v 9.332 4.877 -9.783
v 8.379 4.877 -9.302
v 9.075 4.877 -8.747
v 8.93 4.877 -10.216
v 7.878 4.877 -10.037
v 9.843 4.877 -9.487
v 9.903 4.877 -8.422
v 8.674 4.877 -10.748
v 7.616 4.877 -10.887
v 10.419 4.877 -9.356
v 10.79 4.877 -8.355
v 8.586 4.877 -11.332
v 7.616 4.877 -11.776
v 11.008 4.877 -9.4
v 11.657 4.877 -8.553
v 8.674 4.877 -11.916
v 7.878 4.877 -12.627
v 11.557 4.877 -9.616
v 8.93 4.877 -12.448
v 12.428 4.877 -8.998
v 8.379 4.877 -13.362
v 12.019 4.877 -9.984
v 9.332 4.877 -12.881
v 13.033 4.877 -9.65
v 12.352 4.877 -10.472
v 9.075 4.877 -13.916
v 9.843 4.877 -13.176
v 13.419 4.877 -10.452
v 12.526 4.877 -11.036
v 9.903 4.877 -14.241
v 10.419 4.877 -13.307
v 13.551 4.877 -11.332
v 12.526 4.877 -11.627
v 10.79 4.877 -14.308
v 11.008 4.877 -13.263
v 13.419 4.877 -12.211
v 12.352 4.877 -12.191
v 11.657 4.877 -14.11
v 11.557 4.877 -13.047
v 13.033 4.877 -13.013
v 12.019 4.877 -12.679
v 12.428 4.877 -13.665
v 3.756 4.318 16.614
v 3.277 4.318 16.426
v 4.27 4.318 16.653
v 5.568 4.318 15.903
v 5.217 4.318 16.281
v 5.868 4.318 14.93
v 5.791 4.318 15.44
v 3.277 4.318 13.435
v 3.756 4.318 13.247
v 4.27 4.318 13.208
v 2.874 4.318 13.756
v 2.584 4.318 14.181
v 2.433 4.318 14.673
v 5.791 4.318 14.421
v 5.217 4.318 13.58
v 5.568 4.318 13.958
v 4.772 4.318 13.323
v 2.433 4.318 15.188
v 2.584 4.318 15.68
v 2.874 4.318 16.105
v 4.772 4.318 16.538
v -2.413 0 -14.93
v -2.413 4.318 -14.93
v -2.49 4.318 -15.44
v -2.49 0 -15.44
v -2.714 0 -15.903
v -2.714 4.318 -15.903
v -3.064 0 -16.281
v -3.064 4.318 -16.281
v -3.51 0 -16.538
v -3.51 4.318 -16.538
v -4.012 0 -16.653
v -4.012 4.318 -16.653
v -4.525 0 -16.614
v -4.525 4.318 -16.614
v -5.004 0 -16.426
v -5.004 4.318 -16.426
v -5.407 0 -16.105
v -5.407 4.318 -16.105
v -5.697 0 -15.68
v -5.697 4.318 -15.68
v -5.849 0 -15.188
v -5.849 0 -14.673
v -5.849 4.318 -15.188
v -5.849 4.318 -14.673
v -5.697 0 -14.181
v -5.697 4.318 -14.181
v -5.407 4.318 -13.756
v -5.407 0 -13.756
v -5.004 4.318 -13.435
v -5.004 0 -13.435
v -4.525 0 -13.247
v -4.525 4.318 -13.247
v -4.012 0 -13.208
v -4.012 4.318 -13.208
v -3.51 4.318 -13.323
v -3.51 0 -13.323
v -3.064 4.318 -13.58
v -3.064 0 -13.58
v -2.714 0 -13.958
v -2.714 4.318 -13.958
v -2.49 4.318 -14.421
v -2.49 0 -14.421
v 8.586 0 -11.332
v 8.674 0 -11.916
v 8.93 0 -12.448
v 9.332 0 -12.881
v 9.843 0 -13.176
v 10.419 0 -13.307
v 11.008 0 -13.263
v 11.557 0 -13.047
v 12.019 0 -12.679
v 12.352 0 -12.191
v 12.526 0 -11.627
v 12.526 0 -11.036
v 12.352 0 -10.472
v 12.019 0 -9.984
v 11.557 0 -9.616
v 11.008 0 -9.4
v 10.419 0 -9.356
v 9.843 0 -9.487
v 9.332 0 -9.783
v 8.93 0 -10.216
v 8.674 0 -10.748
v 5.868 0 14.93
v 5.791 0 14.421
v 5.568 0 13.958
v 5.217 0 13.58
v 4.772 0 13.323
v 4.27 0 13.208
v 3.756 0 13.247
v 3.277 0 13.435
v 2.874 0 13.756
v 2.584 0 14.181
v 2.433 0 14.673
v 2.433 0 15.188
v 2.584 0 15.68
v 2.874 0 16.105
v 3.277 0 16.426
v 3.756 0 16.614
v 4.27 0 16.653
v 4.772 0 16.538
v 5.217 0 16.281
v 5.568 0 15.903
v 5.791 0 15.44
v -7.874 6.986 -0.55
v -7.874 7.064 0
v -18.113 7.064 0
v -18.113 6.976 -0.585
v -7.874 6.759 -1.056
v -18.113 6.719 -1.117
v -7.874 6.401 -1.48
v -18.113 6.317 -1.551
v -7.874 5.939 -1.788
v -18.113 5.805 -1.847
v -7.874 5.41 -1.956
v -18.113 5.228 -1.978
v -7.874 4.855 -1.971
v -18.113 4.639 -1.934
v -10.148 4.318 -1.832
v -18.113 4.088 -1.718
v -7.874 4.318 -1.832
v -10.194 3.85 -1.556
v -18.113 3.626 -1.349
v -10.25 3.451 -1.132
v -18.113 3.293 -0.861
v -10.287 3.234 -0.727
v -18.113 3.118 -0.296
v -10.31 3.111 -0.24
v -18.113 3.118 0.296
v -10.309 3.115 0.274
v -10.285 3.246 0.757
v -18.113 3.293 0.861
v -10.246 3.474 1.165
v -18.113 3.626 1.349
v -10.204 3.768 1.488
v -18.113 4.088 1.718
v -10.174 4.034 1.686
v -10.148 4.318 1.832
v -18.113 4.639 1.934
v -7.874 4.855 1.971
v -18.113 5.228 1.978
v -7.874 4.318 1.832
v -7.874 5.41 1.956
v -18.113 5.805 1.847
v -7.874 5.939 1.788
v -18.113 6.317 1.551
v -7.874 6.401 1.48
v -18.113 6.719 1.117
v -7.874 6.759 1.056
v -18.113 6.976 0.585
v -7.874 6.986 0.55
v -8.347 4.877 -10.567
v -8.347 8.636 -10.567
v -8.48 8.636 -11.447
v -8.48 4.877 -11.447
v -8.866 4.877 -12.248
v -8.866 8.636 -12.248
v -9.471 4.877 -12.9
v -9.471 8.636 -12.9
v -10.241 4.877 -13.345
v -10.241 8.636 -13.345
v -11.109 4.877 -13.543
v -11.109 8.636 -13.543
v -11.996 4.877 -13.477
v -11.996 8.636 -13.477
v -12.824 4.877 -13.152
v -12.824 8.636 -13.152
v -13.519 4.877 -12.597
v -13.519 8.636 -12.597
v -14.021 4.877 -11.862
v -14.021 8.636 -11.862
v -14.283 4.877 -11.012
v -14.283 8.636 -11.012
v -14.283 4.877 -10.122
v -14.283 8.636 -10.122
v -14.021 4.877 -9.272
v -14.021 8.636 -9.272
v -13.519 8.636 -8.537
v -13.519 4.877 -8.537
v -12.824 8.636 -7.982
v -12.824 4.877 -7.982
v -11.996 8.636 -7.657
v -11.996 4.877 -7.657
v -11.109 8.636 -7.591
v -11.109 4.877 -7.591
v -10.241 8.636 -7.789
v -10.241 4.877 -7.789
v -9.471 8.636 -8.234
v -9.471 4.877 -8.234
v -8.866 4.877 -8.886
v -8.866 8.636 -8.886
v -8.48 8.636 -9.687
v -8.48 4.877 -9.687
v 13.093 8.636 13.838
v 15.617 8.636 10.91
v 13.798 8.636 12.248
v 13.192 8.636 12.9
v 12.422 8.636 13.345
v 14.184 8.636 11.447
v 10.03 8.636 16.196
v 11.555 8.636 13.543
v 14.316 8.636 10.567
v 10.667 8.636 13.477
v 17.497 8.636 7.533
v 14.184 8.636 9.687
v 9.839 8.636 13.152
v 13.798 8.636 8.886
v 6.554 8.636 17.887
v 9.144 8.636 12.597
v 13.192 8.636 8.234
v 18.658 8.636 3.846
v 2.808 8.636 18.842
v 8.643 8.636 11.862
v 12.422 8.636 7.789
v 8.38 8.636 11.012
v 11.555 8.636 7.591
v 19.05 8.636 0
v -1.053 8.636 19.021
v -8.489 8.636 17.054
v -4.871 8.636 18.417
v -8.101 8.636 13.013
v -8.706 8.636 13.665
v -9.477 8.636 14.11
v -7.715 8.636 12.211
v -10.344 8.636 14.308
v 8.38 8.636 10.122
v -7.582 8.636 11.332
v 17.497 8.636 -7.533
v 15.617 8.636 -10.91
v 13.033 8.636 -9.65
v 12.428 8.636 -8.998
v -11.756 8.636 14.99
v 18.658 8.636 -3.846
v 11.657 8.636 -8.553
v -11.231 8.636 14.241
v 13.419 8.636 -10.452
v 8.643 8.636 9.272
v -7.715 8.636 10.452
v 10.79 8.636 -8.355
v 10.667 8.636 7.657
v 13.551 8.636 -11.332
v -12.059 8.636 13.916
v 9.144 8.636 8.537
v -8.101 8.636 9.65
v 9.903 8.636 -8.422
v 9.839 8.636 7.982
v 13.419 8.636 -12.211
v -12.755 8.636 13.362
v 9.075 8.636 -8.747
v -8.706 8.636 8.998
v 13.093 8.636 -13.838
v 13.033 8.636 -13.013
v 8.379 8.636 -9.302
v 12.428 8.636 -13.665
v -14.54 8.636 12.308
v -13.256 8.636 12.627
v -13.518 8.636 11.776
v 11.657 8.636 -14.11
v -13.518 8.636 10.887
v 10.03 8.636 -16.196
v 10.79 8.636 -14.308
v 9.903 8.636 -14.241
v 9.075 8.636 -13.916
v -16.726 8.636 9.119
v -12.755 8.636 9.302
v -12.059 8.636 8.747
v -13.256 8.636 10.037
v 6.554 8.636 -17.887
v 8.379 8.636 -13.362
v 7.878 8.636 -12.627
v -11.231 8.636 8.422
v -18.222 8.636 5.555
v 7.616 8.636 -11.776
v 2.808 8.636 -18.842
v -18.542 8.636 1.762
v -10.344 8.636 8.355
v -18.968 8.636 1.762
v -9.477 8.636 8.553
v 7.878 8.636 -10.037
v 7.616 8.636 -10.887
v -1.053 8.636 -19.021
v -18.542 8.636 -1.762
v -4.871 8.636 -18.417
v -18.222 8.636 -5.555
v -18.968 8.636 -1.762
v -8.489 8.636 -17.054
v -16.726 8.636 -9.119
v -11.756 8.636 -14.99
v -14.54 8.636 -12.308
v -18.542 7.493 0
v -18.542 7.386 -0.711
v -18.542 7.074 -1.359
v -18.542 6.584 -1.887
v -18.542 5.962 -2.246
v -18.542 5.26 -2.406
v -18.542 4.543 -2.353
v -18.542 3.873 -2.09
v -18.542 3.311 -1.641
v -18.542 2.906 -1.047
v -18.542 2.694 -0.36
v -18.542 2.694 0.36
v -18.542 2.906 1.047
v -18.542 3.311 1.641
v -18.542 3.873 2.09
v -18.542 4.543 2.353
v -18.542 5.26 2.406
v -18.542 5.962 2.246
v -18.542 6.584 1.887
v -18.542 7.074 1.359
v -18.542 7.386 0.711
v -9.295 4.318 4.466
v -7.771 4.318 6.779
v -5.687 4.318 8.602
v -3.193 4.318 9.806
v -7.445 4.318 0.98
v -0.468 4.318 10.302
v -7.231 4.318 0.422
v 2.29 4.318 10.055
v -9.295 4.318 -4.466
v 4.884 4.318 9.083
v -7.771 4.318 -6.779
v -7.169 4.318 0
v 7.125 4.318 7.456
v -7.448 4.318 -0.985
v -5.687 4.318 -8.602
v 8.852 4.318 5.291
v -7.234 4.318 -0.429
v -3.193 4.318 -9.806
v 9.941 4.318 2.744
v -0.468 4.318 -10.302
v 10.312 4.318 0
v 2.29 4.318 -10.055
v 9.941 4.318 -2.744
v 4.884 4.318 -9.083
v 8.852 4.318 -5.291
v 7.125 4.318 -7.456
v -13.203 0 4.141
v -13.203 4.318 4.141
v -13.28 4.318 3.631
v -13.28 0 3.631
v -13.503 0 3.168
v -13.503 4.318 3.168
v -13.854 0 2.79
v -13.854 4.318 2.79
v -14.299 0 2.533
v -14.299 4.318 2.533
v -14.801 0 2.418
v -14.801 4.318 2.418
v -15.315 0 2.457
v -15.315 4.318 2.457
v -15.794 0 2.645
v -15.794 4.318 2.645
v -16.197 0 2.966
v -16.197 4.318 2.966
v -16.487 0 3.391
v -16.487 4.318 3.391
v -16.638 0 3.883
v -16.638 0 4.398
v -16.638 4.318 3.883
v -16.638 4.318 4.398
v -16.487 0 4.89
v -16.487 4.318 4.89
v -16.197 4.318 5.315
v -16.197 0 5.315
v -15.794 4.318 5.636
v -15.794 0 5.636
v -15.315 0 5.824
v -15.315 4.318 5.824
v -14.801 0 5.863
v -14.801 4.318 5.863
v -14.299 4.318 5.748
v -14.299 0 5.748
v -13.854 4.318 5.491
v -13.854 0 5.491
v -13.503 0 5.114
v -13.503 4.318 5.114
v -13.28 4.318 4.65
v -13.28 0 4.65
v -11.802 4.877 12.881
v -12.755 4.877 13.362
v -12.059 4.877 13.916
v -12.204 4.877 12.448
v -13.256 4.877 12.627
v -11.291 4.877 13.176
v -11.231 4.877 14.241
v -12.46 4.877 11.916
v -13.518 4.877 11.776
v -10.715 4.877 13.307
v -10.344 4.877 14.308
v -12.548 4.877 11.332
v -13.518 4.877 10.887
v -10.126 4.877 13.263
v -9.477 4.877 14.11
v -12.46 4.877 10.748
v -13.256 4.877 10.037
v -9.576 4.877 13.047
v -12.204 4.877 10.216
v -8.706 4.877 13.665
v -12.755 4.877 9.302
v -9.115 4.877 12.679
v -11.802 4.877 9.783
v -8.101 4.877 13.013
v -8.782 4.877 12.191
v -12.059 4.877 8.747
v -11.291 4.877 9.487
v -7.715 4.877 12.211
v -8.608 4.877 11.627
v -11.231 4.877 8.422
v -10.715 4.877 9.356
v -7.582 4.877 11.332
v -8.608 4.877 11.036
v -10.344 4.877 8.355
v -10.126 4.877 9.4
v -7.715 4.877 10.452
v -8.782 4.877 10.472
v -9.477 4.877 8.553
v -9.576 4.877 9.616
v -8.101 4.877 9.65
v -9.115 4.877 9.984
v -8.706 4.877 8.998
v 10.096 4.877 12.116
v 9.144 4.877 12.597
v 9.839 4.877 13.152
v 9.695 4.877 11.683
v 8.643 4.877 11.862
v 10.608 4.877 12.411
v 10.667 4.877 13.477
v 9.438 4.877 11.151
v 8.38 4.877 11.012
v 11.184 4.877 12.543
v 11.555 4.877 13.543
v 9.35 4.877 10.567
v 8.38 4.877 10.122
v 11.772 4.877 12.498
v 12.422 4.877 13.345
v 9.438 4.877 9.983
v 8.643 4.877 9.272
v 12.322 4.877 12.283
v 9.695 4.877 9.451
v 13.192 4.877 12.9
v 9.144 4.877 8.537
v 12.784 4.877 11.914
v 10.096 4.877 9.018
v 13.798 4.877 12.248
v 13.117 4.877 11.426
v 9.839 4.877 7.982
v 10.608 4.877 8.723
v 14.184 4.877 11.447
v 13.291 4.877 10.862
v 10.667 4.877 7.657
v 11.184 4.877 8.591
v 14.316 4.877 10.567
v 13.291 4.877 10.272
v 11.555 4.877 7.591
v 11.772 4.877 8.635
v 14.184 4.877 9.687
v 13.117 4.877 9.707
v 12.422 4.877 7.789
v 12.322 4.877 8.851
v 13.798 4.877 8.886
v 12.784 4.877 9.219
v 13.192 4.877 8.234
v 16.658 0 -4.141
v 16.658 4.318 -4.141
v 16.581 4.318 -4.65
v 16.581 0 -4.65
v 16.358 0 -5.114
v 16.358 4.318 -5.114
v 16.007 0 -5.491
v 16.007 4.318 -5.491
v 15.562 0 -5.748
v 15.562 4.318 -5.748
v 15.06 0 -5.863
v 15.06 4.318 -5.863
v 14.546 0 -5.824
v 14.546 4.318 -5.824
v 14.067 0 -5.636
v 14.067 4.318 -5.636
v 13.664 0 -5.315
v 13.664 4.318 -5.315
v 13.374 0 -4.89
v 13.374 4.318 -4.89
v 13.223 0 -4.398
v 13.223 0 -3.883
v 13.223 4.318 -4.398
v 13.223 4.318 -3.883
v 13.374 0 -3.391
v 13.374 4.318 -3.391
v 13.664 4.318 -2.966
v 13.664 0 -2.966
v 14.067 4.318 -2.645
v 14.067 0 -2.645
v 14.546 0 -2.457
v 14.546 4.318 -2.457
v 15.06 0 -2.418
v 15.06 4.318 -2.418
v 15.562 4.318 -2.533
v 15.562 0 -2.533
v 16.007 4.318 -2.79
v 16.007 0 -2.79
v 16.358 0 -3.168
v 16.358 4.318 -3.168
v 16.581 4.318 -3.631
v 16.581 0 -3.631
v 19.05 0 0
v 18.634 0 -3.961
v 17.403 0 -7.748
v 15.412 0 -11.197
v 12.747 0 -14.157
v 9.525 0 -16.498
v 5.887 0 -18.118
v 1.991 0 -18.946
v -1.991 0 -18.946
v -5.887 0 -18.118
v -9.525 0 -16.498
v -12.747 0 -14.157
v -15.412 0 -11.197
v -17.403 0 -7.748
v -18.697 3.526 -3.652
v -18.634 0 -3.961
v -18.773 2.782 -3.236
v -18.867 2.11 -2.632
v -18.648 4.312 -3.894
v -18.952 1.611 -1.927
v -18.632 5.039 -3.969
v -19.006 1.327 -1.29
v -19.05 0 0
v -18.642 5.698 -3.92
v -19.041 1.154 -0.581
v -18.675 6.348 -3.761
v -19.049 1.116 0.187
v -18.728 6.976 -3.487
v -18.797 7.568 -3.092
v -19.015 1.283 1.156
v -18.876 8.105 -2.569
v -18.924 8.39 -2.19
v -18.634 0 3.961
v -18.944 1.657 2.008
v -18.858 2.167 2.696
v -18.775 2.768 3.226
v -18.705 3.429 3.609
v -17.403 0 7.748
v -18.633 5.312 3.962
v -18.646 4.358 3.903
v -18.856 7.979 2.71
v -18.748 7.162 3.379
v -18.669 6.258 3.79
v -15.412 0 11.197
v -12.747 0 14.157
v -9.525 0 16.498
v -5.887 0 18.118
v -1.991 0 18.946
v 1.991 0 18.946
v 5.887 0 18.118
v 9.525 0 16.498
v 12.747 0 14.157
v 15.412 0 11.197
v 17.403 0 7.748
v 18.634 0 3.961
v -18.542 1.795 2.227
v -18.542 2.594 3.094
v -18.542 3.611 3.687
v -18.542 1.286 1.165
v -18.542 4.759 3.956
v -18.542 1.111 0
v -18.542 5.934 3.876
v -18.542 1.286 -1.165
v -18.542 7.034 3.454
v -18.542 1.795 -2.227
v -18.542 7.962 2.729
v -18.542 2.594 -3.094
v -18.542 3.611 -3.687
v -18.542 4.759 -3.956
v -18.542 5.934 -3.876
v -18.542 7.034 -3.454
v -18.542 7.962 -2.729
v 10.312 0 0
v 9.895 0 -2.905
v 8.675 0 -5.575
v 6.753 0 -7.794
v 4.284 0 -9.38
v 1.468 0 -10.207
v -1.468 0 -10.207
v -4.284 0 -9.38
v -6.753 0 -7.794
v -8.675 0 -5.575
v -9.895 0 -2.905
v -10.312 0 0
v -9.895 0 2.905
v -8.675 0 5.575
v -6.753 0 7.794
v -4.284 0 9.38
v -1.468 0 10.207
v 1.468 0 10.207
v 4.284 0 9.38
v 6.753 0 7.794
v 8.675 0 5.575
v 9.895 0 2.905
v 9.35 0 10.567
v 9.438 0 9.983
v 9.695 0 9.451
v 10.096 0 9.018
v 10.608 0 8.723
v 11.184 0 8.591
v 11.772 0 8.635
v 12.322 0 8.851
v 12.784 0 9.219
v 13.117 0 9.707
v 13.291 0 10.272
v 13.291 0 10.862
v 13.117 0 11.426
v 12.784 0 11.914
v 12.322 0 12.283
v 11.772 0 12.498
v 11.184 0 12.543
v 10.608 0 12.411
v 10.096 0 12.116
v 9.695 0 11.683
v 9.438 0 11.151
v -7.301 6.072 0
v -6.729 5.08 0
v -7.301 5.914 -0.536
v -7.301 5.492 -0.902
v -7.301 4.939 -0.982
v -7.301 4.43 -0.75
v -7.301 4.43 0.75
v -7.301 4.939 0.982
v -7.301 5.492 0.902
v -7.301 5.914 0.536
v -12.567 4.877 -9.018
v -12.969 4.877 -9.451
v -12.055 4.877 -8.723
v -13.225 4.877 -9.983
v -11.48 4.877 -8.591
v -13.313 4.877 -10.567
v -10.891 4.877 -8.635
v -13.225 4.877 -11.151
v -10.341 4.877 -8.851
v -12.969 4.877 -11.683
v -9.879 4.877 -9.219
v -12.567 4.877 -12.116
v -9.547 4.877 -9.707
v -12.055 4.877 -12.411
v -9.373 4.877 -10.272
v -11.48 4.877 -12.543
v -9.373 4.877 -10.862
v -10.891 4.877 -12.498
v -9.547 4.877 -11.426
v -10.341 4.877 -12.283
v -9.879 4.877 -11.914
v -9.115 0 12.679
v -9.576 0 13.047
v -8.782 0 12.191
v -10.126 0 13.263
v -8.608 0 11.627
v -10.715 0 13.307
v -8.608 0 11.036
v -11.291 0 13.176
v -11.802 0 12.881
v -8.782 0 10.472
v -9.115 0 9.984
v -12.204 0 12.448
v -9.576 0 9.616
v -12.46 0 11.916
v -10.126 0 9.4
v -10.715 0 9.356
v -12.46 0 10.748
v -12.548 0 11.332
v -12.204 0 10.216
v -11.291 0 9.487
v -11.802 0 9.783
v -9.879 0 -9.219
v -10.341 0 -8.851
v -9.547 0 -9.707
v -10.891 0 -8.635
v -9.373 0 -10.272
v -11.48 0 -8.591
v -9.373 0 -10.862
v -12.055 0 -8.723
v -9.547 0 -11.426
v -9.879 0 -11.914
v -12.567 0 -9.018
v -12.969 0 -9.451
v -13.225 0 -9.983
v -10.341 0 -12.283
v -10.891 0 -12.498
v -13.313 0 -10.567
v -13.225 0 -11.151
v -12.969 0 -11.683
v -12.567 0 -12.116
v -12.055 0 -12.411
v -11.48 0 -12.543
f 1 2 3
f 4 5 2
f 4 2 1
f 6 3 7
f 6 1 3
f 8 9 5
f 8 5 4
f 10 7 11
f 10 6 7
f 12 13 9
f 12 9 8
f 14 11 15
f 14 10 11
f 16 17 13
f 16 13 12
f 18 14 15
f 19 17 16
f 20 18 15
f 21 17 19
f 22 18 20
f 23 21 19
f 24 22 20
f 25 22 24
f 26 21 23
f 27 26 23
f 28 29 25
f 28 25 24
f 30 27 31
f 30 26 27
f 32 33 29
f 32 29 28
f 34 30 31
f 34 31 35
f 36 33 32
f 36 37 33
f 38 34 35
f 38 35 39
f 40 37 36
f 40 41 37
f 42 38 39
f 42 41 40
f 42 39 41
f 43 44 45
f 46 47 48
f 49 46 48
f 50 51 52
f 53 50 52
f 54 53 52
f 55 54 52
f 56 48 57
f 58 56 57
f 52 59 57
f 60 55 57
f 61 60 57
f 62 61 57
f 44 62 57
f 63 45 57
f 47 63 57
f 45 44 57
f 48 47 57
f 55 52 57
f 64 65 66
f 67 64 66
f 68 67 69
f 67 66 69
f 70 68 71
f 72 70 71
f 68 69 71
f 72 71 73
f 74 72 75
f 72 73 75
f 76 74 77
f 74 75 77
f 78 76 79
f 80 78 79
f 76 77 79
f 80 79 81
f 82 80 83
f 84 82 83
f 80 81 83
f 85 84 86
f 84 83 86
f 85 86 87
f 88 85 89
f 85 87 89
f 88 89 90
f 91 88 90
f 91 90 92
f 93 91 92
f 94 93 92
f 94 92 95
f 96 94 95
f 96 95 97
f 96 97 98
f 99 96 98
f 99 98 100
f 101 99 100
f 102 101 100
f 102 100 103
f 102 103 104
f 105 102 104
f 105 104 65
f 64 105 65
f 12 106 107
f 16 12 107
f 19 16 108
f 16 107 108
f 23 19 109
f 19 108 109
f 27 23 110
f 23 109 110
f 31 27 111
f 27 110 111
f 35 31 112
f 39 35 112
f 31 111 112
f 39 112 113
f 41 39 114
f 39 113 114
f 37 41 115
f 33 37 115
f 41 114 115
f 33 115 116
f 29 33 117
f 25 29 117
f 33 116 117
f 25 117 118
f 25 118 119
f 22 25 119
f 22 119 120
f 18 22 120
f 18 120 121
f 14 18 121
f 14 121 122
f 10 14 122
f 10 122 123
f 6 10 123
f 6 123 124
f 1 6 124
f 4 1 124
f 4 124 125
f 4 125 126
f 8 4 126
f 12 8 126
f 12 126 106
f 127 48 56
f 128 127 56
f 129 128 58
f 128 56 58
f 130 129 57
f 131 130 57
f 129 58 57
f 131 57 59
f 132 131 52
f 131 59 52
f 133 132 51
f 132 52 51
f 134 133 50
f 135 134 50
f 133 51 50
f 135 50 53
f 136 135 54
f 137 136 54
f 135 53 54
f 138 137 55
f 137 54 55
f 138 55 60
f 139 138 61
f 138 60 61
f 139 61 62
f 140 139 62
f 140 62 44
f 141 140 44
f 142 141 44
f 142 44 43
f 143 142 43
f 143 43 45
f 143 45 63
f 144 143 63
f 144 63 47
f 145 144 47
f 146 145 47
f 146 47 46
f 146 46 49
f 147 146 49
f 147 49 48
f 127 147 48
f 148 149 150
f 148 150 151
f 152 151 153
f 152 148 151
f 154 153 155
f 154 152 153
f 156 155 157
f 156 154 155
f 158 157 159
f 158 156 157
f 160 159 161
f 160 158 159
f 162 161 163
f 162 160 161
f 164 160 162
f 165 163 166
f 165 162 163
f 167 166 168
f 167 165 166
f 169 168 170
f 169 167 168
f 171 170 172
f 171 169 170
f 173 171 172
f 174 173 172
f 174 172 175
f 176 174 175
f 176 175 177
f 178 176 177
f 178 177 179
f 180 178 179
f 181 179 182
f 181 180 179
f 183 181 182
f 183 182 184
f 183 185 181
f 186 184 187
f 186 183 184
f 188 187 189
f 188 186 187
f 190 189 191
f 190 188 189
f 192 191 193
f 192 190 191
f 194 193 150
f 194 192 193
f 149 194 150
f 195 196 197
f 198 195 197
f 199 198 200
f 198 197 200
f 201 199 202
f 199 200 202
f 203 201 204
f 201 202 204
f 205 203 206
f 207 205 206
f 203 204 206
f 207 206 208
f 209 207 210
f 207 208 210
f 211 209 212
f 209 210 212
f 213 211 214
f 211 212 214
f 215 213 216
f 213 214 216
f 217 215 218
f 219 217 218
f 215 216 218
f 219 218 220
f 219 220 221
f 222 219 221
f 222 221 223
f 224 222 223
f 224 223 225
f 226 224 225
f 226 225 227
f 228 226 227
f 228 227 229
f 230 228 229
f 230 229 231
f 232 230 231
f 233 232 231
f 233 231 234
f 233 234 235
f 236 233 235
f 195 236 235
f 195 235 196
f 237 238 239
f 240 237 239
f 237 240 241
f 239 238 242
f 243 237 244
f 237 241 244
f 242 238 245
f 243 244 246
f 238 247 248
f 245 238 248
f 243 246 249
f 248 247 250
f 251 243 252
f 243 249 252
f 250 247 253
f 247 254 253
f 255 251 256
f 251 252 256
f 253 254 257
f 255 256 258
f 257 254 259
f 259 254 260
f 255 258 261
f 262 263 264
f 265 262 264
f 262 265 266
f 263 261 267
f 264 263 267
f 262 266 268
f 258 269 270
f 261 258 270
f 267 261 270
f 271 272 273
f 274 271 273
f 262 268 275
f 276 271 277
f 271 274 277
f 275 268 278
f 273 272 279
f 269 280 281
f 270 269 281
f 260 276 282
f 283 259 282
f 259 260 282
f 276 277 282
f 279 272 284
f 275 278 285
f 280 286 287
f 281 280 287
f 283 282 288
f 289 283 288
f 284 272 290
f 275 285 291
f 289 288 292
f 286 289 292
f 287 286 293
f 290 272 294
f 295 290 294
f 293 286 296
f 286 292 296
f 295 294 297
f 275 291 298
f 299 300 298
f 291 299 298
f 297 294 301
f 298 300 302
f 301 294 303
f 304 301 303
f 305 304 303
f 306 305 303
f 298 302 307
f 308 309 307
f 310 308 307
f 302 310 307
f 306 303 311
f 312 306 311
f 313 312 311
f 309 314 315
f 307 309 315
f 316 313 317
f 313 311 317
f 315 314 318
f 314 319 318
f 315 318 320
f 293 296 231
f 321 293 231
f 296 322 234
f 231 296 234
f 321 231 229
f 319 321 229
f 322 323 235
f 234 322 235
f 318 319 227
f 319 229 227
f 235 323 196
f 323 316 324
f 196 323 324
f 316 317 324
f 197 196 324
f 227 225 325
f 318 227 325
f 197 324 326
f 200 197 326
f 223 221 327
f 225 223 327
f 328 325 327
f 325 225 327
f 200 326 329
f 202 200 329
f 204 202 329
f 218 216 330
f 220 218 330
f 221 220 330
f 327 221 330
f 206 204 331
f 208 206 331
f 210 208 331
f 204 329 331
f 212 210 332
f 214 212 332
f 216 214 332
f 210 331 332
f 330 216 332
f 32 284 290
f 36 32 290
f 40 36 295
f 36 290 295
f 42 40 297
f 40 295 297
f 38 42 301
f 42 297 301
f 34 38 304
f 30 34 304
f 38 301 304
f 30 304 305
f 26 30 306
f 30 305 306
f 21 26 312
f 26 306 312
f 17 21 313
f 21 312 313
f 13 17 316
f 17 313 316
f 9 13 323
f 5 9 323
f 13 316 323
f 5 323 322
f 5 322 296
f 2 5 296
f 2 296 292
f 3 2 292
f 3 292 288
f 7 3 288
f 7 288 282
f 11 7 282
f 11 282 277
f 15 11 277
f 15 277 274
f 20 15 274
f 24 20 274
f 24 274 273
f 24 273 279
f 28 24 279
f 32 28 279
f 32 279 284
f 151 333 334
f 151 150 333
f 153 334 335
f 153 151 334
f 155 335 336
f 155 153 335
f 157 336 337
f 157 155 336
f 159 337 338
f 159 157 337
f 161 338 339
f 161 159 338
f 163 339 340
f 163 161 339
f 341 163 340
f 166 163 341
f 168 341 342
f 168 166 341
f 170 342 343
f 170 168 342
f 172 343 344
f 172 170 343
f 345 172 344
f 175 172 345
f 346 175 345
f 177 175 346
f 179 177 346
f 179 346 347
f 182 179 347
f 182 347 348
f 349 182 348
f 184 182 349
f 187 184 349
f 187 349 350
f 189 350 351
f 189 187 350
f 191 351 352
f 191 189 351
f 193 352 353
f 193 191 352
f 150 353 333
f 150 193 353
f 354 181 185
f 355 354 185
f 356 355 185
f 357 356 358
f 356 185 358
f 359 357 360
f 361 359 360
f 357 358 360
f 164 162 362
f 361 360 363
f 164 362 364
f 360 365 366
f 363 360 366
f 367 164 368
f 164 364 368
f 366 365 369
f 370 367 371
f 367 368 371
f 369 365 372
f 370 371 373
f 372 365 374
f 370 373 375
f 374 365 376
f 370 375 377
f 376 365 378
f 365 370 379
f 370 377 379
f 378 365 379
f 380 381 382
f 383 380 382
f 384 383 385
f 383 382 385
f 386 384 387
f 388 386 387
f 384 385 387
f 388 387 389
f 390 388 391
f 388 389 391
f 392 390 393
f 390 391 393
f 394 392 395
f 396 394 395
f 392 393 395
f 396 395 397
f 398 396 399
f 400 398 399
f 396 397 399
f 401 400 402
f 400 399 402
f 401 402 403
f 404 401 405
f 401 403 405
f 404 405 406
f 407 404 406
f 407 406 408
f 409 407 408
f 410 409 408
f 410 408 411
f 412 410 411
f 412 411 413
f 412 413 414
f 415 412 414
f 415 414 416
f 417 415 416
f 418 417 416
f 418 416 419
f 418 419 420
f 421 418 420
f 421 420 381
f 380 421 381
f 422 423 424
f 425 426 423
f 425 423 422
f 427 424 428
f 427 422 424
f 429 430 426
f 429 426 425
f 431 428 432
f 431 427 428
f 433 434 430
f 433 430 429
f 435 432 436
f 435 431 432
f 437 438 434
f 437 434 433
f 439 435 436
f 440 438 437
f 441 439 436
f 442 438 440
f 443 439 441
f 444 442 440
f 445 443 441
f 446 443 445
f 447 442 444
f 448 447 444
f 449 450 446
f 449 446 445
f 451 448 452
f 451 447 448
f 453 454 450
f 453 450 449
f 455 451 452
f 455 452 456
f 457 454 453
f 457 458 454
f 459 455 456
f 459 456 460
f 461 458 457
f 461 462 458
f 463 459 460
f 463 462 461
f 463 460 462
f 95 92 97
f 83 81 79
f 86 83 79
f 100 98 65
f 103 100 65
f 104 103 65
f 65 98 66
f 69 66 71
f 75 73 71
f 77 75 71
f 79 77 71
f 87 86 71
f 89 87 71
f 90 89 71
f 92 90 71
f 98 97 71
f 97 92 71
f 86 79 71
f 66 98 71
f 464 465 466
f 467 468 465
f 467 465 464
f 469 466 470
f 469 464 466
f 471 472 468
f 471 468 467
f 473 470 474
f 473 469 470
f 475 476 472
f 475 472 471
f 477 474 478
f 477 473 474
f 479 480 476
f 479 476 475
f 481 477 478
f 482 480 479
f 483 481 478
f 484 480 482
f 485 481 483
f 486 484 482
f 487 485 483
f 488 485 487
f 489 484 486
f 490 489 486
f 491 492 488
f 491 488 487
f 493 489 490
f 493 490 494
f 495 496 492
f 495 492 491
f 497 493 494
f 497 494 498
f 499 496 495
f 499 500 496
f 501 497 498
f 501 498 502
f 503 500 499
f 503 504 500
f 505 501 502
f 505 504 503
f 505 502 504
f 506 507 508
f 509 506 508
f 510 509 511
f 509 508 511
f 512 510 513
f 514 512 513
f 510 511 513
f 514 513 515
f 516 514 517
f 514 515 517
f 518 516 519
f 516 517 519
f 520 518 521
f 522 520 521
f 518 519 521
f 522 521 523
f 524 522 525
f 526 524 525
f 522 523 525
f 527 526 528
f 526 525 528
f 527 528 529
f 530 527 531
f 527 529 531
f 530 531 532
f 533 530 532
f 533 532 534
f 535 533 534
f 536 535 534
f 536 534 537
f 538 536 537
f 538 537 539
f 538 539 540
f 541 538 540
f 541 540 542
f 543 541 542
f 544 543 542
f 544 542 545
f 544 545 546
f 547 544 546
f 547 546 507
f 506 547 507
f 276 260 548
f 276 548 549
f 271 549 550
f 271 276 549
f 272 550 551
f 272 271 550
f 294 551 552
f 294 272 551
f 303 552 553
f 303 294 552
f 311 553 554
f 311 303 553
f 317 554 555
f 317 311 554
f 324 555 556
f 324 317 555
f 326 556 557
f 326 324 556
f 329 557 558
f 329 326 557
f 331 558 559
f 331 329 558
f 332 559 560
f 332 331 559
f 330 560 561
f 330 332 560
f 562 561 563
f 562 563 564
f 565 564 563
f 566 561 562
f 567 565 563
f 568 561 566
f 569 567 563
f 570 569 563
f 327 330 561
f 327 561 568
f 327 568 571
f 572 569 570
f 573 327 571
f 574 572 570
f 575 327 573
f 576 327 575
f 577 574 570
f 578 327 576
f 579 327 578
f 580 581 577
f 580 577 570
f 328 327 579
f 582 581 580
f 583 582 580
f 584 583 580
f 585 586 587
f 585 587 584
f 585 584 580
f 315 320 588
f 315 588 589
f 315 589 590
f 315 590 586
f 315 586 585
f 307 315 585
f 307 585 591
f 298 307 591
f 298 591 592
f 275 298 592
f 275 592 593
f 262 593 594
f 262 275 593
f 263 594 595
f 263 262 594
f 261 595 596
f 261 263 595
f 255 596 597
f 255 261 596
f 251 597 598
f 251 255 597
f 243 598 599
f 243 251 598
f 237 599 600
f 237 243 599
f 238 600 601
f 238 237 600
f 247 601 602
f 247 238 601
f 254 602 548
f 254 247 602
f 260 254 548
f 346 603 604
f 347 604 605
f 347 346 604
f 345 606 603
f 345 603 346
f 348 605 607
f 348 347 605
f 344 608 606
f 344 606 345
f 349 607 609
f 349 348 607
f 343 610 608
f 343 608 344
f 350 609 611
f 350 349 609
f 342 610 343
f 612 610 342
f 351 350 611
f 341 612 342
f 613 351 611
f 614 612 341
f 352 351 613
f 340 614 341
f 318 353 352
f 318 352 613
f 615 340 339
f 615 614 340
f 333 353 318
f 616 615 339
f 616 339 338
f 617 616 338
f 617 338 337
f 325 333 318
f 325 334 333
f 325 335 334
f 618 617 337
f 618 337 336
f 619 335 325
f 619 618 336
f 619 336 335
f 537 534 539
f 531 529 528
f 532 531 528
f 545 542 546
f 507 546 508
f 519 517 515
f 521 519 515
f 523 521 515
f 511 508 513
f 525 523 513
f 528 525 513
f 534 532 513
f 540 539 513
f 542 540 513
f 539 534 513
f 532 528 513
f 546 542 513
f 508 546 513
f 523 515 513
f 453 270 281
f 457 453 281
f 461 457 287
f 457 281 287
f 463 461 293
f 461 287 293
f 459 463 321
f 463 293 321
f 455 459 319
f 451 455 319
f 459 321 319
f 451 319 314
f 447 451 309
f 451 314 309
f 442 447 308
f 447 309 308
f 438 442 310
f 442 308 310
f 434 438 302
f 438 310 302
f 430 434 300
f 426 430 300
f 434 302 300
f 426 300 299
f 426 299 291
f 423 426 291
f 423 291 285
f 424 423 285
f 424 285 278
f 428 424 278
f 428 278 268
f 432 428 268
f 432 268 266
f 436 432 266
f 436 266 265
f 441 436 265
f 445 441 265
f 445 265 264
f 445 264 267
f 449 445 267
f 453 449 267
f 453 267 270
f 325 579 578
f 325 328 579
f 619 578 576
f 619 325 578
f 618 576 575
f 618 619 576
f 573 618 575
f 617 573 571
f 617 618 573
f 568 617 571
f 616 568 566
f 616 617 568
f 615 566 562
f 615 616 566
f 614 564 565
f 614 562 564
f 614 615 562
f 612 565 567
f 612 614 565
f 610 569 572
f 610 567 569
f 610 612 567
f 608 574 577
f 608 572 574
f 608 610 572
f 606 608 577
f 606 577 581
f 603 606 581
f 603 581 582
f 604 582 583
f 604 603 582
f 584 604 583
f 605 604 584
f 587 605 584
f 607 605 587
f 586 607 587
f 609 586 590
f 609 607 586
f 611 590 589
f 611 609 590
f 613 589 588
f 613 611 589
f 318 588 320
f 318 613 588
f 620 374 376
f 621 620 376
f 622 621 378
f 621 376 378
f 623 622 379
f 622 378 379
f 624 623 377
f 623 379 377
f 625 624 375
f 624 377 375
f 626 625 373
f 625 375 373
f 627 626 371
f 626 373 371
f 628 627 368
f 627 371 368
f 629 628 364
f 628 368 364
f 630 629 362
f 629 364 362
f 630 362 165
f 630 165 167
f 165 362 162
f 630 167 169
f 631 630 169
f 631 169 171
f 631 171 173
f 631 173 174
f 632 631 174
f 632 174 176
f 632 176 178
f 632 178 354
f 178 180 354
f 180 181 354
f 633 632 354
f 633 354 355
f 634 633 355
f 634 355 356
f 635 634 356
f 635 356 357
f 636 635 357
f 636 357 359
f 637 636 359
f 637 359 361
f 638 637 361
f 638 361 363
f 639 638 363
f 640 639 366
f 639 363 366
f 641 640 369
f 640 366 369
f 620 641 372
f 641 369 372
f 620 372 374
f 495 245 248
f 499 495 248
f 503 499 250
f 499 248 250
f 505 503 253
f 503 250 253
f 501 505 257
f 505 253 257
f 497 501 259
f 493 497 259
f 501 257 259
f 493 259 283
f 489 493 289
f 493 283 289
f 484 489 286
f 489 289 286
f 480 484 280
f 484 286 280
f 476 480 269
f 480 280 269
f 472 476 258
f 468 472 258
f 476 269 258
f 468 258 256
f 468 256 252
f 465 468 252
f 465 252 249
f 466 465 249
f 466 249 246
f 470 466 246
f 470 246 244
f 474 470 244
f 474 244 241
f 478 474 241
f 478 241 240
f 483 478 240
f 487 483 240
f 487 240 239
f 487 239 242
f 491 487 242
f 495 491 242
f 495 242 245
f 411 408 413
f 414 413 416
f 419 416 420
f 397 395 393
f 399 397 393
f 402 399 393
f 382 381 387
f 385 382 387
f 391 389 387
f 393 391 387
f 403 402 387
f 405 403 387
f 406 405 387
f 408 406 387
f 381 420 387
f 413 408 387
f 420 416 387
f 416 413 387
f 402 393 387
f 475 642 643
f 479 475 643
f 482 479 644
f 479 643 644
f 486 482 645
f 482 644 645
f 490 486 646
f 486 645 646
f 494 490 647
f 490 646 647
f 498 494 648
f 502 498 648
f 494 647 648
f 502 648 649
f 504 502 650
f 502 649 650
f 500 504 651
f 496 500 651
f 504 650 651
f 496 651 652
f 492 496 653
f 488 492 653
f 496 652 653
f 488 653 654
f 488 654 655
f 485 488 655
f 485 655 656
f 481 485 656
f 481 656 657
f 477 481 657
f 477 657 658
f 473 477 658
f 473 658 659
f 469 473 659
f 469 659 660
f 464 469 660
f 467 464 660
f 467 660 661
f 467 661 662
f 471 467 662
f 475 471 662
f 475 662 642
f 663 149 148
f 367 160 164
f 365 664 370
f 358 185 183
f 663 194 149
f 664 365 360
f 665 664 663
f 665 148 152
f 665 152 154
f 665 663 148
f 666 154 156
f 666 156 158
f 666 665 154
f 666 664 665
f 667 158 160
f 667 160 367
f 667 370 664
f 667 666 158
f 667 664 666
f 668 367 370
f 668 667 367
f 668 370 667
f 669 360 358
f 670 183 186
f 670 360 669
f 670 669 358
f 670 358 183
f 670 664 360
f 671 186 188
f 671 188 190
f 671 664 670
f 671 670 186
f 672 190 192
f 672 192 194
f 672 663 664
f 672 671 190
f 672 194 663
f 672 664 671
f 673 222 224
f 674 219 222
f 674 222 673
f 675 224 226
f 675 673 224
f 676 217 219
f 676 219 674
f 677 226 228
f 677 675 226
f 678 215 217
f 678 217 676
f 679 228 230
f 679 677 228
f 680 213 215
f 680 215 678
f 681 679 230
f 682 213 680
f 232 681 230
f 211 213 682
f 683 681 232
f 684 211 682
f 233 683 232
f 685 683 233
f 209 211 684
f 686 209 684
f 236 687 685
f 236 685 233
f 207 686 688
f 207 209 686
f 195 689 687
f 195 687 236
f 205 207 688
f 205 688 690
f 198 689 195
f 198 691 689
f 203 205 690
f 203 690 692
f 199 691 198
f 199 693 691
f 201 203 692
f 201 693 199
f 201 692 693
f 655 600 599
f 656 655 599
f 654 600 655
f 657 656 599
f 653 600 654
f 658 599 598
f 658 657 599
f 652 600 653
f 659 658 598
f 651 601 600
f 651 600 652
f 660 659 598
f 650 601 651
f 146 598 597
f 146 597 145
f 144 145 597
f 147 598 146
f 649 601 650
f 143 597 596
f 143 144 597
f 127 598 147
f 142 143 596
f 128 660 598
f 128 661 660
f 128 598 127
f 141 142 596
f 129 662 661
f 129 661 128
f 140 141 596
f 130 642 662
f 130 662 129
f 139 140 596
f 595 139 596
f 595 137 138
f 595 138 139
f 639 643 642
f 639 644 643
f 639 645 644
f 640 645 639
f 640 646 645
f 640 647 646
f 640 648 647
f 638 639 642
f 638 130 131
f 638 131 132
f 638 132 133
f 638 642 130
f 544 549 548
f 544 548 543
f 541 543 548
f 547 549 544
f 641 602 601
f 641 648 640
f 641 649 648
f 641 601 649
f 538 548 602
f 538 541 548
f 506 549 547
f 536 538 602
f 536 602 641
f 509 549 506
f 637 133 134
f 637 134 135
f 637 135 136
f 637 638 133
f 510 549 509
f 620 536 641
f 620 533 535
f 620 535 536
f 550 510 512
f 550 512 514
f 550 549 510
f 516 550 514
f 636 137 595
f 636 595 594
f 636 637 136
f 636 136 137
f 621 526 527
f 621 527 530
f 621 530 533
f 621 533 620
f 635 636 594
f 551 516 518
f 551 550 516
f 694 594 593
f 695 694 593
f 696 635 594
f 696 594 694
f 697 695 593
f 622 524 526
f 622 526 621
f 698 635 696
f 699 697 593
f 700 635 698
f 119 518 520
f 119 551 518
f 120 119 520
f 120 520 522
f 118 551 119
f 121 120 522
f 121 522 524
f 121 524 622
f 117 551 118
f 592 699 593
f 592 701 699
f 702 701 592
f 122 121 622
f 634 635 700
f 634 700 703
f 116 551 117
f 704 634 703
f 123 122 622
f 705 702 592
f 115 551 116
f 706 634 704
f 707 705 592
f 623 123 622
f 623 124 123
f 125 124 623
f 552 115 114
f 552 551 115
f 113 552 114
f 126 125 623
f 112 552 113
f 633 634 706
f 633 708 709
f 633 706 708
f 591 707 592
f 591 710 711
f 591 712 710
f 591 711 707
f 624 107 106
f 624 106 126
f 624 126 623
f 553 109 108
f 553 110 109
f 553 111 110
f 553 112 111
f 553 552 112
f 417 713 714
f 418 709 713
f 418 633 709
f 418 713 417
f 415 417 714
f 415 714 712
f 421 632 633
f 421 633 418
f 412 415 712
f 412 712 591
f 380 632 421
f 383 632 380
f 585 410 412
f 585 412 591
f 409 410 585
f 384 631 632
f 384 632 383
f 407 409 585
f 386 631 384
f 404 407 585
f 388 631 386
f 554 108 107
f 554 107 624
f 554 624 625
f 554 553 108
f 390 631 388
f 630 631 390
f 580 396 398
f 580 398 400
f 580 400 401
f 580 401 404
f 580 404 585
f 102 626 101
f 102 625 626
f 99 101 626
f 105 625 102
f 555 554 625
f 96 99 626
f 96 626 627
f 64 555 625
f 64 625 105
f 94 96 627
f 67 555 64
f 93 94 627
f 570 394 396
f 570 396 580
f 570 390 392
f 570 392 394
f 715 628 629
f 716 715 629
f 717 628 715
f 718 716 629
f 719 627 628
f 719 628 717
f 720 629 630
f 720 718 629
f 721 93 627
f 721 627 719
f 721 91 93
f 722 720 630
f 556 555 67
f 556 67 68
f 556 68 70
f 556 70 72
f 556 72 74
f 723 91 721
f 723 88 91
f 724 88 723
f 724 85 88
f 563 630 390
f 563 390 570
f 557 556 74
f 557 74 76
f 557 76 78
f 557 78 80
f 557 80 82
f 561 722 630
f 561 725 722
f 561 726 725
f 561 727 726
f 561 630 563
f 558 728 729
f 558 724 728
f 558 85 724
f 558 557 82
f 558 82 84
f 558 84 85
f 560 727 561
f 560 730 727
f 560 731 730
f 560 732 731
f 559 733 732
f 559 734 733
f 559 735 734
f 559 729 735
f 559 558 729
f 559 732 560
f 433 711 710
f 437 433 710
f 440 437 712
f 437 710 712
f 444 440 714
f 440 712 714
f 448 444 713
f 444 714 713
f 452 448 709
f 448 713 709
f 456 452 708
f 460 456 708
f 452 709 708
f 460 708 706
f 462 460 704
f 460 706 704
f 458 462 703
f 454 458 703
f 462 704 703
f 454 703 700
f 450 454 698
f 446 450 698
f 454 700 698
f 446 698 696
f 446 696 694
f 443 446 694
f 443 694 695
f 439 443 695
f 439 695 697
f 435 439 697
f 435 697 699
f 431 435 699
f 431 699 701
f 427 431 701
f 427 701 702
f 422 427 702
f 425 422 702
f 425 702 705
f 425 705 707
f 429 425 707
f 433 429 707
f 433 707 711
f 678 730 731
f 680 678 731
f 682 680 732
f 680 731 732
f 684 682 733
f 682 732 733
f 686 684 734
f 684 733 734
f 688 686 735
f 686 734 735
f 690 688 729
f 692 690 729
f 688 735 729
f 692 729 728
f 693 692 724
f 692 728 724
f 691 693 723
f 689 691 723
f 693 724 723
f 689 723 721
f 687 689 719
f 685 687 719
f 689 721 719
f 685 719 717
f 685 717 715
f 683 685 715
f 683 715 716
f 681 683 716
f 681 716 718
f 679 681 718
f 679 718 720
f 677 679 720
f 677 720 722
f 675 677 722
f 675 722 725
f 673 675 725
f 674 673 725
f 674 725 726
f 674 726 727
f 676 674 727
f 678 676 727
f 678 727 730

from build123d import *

# Parameters (mm, degrees)
SKETCH1_W         = 19.05
SKETCH1_H         = 8.636
HOLE1_D           = 3.9624
HOLE1_CBORE_D     = 5.969
HOLE1_CBORE_DEPTH = 3.7592
HOLE2_D           = 3.9624
HOLE2_CBORE_D     = 5.969
HOLE2_CBORE_DEPTH = 3.7592
HOLE3_D           = 3.9624
HOLE3_CBORE_D     = 5.969
HOLE3_CBORE_DEPTH = 3.7592
HOLE4_D           = 3.9624
HOLE4_CBORE_D     = 5.969
HOLE4_CBORE_DEPTH = 3.7592
HOLE5_D           = 20.6248
HOLE5_DEPTH       = 4.318
HOLE6_D           = 3.4544
HOLE6_DEPTH       = 4.318
HOLE7_D           = 3.4544
HOLE7_DEPTH       = 4.318
HOLE8_D           = 3.4544
HOLE8_DEPTH       = 4.318
HOLE9_D           = 3.4544
HOLE9_DEPTH       = 4.318


with BuildPart() as part:
    # Sketch1 → Revolve1 (revolve)
    with BuildSketch(Plane.XY):
        with Locations((9.525, 4.318)):
            Rectangle(SKETCH1_W, SKETCH1_H)
    revolve(axis=Axis((0, 0, 0), (0, 1, 0)))

    # Sketch2 → Cut-Revolve1 (revolve, cut)
    with BuildSketch(Plane.XY):
        Polygon((-19.05, 5.08), (-19.05, 9.04875), (-18.542, 9.04875), (-18.542, 7.493), (-18.11274, 7.06374), (-7.874, 7.06374), (-6.728687177, 5.08), align=None)
    revolve(axis=Axis((-6.728687177, 5.08, 0), (-1, 0, 0)), mode=Mode.SUBTRACT)

    # Hole1 (through all)
    with Locations(Plane(origin=(0, 8.636, 0), x_dir=(1, 0, 0), z_dir=(0, 1, 0))):
        with Locations((-10.566882591, -11.331594253)):
            CounterBoreHole(HOLE1_D / 2, HOLE1_CBORE_D / 2, HOLE1_CBORE_DEPTH)

    # Hole2 (through all)
    with Locations(Plane(origin=(0, 8.636, 0), x_dir=(1, 0, 0), z_dir=(0, 1, 0))):
        with Locations((11.331594253, -10.566882591)):
            CounterBoreHole(HOLE2_D / 2, HOLE2_CBORE_D / 2, HOLE2_CBORE_DEPTH)

    # Hole3 (through all)
    with Locations(Plane(origin=(0, 8.636, 0), x_dir=(1, 0, 0), z_dir=(0, 1, 0))):
        with Locations((10.566882591, 11.331594253)):
            CounterBoreHole(HOLE3_D / 2, HOLE3_CBORE_D / 2, HOLE3_CBORE_DEPTH)

    # Hole4 (through all)
    with Locations(Plane(origin=(0, 8.636, 0), x_dir=(1, 0, 0), z_dir=(0, 1, 0))):
        with Locations((-11.331594253, 10.566882591)):
            CounterBoreHole(HOLE4_D / 2, HOLE4_CBORE_D / 2, HOLE4_CBORE_DEPTH)

    # Hole5
    with Locations(Plane(origin=(0, 0, 0), x_dir=(-1, 0, 0), z_dir=(0, -1, 0))):
        with Locations((0, 0)):
            Hole(HOLE5_D / 2, depth=HOLE5_DEPTH)

    # Hole6
    with Locations(Plane(origin=(0, 0, 0), x_dir=(-1, 0, 0), z_dir=(0, -1, 0))):
        with Locations((14.930490242, -4.140591399)):
            Hole(HOLE6_D / 2, depth=HOLE6_DEPTH)

    # Hole7
    with Locations(Plane(origin=(0, 0, 0), x_dir=(-1, 0, 0), z_dir=(0, -1, 0))):
        with Locations((-4.140591399, -14.930490242)):
            Hole(HOLE7_D / 2, depth=HOLE7_DEPTH)

    # Hole8
    with Locations(Plane(origin=(0, 0, 0), x_dir=(-1, 0, 0), z_dir=(0, -1, 0))):
        with Locations((-14.930490242, 4.140591399)):
            Hole(HOLE8_D / 2, depth=HOLE8_DEPTH)

    # Hole9
    with Locations(Plane(origin=(0, 0, 0), x_dir=(-1, 0, 0), z_dir=(0, -1, 0))):
        with Locations((4.140591399, 14.930490242)):
            Hole(HOLE9_D / 2, depth=HOLE9_DEPTH)


solid = part.part
